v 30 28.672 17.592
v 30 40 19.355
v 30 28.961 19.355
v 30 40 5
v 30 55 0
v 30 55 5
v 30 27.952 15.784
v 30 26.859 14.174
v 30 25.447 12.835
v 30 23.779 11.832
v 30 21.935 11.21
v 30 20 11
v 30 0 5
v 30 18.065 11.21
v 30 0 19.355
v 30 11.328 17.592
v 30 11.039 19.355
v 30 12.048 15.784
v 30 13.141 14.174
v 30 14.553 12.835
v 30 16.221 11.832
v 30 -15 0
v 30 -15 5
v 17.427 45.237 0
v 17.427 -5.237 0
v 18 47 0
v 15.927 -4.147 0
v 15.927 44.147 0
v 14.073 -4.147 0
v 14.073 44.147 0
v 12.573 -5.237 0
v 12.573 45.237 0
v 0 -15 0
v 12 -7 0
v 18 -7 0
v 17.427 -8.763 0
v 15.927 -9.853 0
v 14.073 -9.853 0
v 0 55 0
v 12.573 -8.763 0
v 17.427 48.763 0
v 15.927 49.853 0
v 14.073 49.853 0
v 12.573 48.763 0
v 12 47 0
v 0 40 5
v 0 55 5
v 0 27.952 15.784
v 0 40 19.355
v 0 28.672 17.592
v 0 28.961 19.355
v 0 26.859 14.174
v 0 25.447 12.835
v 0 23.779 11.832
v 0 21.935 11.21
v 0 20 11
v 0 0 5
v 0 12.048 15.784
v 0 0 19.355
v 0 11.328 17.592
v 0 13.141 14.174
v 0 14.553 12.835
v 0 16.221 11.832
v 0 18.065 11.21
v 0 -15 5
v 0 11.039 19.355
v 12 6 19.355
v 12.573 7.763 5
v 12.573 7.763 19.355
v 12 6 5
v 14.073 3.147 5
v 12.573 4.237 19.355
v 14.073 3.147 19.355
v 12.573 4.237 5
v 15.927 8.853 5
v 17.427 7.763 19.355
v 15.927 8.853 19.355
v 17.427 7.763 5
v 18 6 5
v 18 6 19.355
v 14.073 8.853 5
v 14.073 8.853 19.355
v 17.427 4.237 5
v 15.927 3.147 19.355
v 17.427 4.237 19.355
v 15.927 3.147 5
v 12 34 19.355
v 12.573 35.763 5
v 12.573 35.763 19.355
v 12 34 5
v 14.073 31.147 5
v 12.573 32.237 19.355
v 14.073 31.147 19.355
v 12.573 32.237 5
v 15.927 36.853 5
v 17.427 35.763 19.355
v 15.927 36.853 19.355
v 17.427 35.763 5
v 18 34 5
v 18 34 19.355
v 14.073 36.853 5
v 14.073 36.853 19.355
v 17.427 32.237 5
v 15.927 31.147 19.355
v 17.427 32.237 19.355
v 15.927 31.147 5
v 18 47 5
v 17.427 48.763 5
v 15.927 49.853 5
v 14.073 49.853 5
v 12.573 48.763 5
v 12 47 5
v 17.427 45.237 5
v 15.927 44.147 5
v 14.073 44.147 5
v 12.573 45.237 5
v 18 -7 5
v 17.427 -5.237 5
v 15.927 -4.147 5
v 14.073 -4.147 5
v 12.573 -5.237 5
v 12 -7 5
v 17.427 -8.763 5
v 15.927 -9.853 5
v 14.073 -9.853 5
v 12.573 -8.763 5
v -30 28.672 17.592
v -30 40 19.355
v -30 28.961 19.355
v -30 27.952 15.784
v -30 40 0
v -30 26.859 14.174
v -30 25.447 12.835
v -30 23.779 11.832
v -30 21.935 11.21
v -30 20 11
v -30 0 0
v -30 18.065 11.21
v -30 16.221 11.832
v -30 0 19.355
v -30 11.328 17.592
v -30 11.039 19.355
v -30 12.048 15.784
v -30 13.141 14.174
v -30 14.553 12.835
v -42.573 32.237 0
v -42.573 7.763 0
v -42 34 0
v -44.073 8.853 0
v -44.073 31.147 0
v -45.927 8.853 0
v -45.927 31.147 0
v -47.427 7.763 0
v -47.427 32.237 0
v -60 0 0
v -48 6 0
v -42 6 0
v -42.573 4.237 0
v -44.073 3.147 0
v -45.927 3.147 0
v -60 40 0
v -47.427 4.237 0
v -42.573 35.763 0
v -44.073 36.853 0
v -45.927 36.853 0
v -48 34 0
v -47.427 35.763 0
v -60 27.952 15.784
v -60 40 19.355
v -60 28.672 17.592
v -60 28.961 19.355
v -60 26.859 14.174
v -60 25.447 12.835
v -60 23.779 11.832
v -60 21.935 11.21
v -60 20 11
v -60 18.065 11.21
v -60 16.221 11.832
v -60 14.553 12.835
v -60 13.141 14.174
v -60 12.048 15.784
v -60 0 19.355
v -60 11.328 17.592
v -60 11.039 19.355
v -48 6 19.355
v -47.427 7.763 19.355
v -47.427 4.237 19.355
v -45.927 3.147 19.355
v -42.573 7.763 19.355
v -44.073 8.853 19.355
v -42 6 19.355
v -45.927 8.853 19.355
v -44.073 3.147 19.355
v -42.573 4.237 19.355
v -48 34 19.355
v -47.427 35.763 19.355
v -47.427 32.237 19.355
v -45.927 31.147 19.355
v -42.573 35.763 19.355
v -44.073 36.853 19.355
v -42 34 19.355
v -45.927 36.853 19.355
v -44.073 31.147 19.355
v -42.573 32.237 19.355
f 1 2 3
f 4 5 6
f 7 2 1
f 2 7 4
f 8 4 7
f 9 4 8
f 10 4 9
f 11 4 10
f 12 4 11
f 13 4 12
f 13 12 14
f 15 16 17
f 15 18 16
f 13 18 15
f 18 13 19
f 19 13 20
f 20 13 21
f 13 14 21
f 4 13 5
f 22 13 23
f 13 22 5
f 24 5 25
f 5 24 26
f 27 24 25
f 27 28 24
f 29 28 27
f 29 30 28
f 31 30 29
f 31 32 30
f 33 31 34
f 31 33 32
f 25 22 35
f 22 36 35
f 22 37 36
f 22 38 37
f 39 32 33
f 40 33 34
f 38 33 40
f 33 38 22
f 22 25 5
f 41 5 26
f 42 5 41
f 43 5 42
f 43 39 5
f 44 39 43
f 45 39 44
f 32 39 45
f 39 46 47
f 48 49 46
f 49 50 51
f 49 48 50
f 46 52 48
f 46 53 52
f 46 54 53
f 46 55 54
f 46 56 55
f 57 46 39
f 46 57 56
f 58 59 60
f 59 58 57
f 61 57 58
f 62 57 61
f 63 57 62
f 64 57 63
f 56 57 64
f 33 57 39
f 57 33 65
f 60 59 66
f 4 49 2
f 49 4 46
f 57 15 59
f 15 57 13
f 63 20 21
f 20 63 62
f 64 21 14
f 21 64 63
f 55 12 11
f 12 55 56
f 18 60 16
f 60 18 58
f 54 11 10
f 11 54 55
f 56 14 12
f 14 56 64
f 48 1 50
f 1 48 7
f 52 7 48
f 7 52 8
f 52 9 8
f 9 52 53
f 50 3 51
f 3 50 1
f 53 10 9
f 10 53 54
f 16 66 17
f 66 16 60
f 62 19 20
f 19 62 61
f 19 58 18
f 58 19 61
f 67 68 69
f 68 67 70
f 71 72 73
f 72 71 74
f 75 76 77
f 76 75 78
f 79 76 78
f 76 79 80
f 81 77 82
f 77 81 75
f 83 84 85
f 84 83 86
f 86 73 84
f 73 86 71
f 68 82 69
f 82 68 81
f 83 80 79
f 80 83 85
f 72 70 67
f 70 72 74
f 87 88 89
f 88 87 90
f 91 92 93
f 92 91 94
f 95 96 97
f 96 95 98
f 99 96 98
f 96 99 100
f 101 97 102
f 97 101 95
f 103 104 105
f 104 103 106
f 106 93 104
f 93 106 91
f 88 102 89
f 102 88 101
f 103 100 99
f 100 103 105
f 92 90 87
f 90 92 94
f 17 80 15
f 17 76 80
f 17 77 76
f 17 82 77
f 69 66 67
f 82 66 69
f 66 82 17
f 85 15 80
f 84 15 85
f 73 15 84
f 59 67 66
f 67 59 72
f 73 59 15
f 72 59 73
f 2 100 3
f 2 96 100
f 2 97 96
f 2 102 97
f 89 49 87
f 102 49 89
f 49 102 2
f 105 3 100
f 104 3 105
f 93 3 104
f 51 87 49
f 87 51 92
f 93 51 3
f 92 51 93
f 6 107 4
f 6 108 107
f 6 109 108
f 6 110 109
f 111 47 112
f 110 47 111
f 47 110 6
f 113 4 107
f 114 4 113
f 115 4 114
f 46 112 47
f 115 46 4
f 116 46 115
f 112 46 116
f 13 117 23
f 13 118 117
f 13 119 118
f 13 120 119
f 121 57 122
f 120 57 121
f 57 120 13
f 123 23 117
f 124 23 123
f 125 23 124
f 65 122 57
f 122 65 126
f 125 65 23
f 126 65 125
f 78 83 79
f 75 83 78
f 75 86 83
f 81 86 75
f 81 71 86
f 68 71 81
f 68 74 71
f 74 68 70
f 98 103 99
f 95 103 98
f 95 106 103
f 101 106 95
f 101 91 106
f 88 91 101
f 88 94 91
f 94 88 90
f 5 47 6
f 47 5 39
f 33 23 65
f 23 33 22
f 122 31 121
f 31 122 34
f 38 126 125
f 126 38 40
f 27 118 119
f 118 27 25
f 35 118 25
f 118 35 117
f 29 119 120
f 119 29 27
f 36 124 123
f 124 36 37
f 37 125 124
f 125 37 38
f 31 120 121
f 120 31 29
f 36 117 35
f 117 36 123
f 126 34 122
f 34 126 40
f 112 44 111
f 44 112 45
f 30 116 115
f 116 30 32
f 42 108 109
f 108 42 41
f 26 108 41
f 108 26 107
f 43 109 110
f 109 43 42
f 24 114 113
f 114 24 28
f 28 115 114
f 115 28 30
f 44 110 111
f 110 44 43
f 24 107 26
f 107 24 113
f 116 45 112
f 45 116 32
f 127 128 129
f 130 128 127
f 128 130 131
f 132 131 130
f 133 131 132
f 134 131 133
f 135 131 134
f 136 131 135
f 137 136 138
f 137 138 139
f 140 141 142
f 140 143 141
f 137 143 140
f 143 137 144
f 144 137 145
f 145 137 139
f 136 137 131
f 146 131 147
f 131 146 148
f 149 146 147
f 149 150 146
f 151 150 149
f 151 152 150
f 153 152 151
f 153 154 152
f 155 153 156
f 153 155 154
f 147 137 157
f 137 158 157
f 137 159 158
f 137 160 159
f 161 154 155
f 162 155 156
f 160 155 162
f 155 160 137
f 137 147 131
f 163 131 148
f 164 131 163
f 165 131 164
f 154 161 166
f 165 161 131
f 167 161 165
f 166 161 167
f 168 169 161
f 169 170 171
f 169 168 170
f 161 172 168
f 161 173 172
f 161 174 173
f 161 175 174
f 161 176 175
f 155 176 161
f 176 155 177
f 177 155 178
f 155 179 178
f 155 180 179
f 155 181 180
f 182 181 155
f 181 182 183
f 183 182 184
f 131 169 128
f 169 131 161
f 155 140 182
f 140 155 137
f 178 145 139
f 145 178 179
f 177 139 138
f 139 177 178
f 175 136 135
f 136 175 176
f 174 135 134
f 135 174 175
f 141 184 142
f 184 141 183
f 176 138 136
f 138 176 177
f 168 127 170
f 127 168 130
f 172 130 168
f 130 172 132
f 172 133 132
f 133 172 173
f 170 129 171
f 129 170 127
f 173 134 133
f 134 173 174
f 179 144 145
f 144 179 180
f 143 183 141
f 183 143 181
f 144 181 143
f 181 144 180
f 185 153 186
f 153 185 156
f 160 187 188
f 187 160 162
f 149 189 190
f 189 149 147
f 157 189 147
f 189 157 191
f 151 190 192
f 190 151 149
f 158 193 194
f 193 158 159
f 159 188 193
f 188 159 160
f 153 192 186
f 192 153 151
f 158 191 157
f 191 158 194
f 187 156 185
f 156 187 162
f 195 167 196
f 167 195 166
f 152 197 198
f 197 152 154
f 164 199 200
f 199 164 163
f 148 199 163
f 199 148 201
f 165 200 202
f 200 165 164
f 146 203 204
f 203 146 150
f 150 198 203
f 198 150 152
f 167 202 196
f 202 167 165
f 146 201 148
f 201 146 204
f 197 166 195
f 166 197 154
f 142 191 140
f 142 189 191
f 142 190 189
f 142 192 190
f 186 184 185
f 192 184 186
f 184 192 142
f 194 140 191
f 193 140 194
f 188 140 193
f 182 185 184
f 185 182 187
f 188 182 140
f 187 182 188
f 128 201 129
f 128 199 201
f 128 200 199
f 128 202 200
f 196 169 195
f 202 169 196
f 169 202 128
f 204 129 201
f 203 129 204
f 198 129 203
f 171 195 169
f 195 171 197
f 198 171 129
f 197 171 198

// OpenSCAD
hole =30; //	[10:extra small, 20:small, 30:medium, 40:large, 50:XL]
box_thickness = 30;
center_hole = 9; 
screw_hole = 3;
mount_thickness = 5;
base_width = 70;

//bottom half 
difference () {
cube ([box_thickness, hole + 10, hole + 10]);
    
    // center hole 
translate ([0, (hole + 10)/2, (hole + 10)/2])
rotate ([0,90,0])
cylinder (box_thickness +55,center_hole, center_hole,center=true);
    // screw holes
  translate ([box_thickness/2,6,0])    
cylinder (hole + 10,screw_hole,screw_hole);
    translate ([box_thickness/2,hole +4,0])
    cylinder (hole + 10,screw_hole,screw_hole);
     translate ([0,0,hole/1.55])
    
    // cuts in half 
 cube (250,250,hole/2);
}

//screw base
difference () {
translate ([box_thickness/2, (hole+10)/2,mount_thickness/2])
rotate ([0,90,0])
cube ([mount_thickness, base_width, box_thickness], center= true);
translate ([box_thickness/2,-7,-10])
cylinder (hole + 10,screw_hole,screw_hole);
    translate ([box_thickness/2, 47,-10])
cylinder (hole + 10,screw_hole,screw_hole);
}

//top half
translate ([-60,0,0])
difference () {
cube ([box_thickness, hole + 10, hole + 10]);
translate ([0, (hole + 10)/2, (hole + 10)/2])
rotate ([0,90,0])
cylinder (box_thickness +55,center_hole, center_hole,center=true);
  translate ([box_thickness/2,6,0])
cylinder (hole + 10,screw_hole,screw_hole);
    translate ([box_thickness/2,hole + 4,0])
    cylinder (hole + 10,screw_hole,screw_hole);
    translate ([0,0,hole/1.55])
 cube (250,250,hole/2);
  
}
